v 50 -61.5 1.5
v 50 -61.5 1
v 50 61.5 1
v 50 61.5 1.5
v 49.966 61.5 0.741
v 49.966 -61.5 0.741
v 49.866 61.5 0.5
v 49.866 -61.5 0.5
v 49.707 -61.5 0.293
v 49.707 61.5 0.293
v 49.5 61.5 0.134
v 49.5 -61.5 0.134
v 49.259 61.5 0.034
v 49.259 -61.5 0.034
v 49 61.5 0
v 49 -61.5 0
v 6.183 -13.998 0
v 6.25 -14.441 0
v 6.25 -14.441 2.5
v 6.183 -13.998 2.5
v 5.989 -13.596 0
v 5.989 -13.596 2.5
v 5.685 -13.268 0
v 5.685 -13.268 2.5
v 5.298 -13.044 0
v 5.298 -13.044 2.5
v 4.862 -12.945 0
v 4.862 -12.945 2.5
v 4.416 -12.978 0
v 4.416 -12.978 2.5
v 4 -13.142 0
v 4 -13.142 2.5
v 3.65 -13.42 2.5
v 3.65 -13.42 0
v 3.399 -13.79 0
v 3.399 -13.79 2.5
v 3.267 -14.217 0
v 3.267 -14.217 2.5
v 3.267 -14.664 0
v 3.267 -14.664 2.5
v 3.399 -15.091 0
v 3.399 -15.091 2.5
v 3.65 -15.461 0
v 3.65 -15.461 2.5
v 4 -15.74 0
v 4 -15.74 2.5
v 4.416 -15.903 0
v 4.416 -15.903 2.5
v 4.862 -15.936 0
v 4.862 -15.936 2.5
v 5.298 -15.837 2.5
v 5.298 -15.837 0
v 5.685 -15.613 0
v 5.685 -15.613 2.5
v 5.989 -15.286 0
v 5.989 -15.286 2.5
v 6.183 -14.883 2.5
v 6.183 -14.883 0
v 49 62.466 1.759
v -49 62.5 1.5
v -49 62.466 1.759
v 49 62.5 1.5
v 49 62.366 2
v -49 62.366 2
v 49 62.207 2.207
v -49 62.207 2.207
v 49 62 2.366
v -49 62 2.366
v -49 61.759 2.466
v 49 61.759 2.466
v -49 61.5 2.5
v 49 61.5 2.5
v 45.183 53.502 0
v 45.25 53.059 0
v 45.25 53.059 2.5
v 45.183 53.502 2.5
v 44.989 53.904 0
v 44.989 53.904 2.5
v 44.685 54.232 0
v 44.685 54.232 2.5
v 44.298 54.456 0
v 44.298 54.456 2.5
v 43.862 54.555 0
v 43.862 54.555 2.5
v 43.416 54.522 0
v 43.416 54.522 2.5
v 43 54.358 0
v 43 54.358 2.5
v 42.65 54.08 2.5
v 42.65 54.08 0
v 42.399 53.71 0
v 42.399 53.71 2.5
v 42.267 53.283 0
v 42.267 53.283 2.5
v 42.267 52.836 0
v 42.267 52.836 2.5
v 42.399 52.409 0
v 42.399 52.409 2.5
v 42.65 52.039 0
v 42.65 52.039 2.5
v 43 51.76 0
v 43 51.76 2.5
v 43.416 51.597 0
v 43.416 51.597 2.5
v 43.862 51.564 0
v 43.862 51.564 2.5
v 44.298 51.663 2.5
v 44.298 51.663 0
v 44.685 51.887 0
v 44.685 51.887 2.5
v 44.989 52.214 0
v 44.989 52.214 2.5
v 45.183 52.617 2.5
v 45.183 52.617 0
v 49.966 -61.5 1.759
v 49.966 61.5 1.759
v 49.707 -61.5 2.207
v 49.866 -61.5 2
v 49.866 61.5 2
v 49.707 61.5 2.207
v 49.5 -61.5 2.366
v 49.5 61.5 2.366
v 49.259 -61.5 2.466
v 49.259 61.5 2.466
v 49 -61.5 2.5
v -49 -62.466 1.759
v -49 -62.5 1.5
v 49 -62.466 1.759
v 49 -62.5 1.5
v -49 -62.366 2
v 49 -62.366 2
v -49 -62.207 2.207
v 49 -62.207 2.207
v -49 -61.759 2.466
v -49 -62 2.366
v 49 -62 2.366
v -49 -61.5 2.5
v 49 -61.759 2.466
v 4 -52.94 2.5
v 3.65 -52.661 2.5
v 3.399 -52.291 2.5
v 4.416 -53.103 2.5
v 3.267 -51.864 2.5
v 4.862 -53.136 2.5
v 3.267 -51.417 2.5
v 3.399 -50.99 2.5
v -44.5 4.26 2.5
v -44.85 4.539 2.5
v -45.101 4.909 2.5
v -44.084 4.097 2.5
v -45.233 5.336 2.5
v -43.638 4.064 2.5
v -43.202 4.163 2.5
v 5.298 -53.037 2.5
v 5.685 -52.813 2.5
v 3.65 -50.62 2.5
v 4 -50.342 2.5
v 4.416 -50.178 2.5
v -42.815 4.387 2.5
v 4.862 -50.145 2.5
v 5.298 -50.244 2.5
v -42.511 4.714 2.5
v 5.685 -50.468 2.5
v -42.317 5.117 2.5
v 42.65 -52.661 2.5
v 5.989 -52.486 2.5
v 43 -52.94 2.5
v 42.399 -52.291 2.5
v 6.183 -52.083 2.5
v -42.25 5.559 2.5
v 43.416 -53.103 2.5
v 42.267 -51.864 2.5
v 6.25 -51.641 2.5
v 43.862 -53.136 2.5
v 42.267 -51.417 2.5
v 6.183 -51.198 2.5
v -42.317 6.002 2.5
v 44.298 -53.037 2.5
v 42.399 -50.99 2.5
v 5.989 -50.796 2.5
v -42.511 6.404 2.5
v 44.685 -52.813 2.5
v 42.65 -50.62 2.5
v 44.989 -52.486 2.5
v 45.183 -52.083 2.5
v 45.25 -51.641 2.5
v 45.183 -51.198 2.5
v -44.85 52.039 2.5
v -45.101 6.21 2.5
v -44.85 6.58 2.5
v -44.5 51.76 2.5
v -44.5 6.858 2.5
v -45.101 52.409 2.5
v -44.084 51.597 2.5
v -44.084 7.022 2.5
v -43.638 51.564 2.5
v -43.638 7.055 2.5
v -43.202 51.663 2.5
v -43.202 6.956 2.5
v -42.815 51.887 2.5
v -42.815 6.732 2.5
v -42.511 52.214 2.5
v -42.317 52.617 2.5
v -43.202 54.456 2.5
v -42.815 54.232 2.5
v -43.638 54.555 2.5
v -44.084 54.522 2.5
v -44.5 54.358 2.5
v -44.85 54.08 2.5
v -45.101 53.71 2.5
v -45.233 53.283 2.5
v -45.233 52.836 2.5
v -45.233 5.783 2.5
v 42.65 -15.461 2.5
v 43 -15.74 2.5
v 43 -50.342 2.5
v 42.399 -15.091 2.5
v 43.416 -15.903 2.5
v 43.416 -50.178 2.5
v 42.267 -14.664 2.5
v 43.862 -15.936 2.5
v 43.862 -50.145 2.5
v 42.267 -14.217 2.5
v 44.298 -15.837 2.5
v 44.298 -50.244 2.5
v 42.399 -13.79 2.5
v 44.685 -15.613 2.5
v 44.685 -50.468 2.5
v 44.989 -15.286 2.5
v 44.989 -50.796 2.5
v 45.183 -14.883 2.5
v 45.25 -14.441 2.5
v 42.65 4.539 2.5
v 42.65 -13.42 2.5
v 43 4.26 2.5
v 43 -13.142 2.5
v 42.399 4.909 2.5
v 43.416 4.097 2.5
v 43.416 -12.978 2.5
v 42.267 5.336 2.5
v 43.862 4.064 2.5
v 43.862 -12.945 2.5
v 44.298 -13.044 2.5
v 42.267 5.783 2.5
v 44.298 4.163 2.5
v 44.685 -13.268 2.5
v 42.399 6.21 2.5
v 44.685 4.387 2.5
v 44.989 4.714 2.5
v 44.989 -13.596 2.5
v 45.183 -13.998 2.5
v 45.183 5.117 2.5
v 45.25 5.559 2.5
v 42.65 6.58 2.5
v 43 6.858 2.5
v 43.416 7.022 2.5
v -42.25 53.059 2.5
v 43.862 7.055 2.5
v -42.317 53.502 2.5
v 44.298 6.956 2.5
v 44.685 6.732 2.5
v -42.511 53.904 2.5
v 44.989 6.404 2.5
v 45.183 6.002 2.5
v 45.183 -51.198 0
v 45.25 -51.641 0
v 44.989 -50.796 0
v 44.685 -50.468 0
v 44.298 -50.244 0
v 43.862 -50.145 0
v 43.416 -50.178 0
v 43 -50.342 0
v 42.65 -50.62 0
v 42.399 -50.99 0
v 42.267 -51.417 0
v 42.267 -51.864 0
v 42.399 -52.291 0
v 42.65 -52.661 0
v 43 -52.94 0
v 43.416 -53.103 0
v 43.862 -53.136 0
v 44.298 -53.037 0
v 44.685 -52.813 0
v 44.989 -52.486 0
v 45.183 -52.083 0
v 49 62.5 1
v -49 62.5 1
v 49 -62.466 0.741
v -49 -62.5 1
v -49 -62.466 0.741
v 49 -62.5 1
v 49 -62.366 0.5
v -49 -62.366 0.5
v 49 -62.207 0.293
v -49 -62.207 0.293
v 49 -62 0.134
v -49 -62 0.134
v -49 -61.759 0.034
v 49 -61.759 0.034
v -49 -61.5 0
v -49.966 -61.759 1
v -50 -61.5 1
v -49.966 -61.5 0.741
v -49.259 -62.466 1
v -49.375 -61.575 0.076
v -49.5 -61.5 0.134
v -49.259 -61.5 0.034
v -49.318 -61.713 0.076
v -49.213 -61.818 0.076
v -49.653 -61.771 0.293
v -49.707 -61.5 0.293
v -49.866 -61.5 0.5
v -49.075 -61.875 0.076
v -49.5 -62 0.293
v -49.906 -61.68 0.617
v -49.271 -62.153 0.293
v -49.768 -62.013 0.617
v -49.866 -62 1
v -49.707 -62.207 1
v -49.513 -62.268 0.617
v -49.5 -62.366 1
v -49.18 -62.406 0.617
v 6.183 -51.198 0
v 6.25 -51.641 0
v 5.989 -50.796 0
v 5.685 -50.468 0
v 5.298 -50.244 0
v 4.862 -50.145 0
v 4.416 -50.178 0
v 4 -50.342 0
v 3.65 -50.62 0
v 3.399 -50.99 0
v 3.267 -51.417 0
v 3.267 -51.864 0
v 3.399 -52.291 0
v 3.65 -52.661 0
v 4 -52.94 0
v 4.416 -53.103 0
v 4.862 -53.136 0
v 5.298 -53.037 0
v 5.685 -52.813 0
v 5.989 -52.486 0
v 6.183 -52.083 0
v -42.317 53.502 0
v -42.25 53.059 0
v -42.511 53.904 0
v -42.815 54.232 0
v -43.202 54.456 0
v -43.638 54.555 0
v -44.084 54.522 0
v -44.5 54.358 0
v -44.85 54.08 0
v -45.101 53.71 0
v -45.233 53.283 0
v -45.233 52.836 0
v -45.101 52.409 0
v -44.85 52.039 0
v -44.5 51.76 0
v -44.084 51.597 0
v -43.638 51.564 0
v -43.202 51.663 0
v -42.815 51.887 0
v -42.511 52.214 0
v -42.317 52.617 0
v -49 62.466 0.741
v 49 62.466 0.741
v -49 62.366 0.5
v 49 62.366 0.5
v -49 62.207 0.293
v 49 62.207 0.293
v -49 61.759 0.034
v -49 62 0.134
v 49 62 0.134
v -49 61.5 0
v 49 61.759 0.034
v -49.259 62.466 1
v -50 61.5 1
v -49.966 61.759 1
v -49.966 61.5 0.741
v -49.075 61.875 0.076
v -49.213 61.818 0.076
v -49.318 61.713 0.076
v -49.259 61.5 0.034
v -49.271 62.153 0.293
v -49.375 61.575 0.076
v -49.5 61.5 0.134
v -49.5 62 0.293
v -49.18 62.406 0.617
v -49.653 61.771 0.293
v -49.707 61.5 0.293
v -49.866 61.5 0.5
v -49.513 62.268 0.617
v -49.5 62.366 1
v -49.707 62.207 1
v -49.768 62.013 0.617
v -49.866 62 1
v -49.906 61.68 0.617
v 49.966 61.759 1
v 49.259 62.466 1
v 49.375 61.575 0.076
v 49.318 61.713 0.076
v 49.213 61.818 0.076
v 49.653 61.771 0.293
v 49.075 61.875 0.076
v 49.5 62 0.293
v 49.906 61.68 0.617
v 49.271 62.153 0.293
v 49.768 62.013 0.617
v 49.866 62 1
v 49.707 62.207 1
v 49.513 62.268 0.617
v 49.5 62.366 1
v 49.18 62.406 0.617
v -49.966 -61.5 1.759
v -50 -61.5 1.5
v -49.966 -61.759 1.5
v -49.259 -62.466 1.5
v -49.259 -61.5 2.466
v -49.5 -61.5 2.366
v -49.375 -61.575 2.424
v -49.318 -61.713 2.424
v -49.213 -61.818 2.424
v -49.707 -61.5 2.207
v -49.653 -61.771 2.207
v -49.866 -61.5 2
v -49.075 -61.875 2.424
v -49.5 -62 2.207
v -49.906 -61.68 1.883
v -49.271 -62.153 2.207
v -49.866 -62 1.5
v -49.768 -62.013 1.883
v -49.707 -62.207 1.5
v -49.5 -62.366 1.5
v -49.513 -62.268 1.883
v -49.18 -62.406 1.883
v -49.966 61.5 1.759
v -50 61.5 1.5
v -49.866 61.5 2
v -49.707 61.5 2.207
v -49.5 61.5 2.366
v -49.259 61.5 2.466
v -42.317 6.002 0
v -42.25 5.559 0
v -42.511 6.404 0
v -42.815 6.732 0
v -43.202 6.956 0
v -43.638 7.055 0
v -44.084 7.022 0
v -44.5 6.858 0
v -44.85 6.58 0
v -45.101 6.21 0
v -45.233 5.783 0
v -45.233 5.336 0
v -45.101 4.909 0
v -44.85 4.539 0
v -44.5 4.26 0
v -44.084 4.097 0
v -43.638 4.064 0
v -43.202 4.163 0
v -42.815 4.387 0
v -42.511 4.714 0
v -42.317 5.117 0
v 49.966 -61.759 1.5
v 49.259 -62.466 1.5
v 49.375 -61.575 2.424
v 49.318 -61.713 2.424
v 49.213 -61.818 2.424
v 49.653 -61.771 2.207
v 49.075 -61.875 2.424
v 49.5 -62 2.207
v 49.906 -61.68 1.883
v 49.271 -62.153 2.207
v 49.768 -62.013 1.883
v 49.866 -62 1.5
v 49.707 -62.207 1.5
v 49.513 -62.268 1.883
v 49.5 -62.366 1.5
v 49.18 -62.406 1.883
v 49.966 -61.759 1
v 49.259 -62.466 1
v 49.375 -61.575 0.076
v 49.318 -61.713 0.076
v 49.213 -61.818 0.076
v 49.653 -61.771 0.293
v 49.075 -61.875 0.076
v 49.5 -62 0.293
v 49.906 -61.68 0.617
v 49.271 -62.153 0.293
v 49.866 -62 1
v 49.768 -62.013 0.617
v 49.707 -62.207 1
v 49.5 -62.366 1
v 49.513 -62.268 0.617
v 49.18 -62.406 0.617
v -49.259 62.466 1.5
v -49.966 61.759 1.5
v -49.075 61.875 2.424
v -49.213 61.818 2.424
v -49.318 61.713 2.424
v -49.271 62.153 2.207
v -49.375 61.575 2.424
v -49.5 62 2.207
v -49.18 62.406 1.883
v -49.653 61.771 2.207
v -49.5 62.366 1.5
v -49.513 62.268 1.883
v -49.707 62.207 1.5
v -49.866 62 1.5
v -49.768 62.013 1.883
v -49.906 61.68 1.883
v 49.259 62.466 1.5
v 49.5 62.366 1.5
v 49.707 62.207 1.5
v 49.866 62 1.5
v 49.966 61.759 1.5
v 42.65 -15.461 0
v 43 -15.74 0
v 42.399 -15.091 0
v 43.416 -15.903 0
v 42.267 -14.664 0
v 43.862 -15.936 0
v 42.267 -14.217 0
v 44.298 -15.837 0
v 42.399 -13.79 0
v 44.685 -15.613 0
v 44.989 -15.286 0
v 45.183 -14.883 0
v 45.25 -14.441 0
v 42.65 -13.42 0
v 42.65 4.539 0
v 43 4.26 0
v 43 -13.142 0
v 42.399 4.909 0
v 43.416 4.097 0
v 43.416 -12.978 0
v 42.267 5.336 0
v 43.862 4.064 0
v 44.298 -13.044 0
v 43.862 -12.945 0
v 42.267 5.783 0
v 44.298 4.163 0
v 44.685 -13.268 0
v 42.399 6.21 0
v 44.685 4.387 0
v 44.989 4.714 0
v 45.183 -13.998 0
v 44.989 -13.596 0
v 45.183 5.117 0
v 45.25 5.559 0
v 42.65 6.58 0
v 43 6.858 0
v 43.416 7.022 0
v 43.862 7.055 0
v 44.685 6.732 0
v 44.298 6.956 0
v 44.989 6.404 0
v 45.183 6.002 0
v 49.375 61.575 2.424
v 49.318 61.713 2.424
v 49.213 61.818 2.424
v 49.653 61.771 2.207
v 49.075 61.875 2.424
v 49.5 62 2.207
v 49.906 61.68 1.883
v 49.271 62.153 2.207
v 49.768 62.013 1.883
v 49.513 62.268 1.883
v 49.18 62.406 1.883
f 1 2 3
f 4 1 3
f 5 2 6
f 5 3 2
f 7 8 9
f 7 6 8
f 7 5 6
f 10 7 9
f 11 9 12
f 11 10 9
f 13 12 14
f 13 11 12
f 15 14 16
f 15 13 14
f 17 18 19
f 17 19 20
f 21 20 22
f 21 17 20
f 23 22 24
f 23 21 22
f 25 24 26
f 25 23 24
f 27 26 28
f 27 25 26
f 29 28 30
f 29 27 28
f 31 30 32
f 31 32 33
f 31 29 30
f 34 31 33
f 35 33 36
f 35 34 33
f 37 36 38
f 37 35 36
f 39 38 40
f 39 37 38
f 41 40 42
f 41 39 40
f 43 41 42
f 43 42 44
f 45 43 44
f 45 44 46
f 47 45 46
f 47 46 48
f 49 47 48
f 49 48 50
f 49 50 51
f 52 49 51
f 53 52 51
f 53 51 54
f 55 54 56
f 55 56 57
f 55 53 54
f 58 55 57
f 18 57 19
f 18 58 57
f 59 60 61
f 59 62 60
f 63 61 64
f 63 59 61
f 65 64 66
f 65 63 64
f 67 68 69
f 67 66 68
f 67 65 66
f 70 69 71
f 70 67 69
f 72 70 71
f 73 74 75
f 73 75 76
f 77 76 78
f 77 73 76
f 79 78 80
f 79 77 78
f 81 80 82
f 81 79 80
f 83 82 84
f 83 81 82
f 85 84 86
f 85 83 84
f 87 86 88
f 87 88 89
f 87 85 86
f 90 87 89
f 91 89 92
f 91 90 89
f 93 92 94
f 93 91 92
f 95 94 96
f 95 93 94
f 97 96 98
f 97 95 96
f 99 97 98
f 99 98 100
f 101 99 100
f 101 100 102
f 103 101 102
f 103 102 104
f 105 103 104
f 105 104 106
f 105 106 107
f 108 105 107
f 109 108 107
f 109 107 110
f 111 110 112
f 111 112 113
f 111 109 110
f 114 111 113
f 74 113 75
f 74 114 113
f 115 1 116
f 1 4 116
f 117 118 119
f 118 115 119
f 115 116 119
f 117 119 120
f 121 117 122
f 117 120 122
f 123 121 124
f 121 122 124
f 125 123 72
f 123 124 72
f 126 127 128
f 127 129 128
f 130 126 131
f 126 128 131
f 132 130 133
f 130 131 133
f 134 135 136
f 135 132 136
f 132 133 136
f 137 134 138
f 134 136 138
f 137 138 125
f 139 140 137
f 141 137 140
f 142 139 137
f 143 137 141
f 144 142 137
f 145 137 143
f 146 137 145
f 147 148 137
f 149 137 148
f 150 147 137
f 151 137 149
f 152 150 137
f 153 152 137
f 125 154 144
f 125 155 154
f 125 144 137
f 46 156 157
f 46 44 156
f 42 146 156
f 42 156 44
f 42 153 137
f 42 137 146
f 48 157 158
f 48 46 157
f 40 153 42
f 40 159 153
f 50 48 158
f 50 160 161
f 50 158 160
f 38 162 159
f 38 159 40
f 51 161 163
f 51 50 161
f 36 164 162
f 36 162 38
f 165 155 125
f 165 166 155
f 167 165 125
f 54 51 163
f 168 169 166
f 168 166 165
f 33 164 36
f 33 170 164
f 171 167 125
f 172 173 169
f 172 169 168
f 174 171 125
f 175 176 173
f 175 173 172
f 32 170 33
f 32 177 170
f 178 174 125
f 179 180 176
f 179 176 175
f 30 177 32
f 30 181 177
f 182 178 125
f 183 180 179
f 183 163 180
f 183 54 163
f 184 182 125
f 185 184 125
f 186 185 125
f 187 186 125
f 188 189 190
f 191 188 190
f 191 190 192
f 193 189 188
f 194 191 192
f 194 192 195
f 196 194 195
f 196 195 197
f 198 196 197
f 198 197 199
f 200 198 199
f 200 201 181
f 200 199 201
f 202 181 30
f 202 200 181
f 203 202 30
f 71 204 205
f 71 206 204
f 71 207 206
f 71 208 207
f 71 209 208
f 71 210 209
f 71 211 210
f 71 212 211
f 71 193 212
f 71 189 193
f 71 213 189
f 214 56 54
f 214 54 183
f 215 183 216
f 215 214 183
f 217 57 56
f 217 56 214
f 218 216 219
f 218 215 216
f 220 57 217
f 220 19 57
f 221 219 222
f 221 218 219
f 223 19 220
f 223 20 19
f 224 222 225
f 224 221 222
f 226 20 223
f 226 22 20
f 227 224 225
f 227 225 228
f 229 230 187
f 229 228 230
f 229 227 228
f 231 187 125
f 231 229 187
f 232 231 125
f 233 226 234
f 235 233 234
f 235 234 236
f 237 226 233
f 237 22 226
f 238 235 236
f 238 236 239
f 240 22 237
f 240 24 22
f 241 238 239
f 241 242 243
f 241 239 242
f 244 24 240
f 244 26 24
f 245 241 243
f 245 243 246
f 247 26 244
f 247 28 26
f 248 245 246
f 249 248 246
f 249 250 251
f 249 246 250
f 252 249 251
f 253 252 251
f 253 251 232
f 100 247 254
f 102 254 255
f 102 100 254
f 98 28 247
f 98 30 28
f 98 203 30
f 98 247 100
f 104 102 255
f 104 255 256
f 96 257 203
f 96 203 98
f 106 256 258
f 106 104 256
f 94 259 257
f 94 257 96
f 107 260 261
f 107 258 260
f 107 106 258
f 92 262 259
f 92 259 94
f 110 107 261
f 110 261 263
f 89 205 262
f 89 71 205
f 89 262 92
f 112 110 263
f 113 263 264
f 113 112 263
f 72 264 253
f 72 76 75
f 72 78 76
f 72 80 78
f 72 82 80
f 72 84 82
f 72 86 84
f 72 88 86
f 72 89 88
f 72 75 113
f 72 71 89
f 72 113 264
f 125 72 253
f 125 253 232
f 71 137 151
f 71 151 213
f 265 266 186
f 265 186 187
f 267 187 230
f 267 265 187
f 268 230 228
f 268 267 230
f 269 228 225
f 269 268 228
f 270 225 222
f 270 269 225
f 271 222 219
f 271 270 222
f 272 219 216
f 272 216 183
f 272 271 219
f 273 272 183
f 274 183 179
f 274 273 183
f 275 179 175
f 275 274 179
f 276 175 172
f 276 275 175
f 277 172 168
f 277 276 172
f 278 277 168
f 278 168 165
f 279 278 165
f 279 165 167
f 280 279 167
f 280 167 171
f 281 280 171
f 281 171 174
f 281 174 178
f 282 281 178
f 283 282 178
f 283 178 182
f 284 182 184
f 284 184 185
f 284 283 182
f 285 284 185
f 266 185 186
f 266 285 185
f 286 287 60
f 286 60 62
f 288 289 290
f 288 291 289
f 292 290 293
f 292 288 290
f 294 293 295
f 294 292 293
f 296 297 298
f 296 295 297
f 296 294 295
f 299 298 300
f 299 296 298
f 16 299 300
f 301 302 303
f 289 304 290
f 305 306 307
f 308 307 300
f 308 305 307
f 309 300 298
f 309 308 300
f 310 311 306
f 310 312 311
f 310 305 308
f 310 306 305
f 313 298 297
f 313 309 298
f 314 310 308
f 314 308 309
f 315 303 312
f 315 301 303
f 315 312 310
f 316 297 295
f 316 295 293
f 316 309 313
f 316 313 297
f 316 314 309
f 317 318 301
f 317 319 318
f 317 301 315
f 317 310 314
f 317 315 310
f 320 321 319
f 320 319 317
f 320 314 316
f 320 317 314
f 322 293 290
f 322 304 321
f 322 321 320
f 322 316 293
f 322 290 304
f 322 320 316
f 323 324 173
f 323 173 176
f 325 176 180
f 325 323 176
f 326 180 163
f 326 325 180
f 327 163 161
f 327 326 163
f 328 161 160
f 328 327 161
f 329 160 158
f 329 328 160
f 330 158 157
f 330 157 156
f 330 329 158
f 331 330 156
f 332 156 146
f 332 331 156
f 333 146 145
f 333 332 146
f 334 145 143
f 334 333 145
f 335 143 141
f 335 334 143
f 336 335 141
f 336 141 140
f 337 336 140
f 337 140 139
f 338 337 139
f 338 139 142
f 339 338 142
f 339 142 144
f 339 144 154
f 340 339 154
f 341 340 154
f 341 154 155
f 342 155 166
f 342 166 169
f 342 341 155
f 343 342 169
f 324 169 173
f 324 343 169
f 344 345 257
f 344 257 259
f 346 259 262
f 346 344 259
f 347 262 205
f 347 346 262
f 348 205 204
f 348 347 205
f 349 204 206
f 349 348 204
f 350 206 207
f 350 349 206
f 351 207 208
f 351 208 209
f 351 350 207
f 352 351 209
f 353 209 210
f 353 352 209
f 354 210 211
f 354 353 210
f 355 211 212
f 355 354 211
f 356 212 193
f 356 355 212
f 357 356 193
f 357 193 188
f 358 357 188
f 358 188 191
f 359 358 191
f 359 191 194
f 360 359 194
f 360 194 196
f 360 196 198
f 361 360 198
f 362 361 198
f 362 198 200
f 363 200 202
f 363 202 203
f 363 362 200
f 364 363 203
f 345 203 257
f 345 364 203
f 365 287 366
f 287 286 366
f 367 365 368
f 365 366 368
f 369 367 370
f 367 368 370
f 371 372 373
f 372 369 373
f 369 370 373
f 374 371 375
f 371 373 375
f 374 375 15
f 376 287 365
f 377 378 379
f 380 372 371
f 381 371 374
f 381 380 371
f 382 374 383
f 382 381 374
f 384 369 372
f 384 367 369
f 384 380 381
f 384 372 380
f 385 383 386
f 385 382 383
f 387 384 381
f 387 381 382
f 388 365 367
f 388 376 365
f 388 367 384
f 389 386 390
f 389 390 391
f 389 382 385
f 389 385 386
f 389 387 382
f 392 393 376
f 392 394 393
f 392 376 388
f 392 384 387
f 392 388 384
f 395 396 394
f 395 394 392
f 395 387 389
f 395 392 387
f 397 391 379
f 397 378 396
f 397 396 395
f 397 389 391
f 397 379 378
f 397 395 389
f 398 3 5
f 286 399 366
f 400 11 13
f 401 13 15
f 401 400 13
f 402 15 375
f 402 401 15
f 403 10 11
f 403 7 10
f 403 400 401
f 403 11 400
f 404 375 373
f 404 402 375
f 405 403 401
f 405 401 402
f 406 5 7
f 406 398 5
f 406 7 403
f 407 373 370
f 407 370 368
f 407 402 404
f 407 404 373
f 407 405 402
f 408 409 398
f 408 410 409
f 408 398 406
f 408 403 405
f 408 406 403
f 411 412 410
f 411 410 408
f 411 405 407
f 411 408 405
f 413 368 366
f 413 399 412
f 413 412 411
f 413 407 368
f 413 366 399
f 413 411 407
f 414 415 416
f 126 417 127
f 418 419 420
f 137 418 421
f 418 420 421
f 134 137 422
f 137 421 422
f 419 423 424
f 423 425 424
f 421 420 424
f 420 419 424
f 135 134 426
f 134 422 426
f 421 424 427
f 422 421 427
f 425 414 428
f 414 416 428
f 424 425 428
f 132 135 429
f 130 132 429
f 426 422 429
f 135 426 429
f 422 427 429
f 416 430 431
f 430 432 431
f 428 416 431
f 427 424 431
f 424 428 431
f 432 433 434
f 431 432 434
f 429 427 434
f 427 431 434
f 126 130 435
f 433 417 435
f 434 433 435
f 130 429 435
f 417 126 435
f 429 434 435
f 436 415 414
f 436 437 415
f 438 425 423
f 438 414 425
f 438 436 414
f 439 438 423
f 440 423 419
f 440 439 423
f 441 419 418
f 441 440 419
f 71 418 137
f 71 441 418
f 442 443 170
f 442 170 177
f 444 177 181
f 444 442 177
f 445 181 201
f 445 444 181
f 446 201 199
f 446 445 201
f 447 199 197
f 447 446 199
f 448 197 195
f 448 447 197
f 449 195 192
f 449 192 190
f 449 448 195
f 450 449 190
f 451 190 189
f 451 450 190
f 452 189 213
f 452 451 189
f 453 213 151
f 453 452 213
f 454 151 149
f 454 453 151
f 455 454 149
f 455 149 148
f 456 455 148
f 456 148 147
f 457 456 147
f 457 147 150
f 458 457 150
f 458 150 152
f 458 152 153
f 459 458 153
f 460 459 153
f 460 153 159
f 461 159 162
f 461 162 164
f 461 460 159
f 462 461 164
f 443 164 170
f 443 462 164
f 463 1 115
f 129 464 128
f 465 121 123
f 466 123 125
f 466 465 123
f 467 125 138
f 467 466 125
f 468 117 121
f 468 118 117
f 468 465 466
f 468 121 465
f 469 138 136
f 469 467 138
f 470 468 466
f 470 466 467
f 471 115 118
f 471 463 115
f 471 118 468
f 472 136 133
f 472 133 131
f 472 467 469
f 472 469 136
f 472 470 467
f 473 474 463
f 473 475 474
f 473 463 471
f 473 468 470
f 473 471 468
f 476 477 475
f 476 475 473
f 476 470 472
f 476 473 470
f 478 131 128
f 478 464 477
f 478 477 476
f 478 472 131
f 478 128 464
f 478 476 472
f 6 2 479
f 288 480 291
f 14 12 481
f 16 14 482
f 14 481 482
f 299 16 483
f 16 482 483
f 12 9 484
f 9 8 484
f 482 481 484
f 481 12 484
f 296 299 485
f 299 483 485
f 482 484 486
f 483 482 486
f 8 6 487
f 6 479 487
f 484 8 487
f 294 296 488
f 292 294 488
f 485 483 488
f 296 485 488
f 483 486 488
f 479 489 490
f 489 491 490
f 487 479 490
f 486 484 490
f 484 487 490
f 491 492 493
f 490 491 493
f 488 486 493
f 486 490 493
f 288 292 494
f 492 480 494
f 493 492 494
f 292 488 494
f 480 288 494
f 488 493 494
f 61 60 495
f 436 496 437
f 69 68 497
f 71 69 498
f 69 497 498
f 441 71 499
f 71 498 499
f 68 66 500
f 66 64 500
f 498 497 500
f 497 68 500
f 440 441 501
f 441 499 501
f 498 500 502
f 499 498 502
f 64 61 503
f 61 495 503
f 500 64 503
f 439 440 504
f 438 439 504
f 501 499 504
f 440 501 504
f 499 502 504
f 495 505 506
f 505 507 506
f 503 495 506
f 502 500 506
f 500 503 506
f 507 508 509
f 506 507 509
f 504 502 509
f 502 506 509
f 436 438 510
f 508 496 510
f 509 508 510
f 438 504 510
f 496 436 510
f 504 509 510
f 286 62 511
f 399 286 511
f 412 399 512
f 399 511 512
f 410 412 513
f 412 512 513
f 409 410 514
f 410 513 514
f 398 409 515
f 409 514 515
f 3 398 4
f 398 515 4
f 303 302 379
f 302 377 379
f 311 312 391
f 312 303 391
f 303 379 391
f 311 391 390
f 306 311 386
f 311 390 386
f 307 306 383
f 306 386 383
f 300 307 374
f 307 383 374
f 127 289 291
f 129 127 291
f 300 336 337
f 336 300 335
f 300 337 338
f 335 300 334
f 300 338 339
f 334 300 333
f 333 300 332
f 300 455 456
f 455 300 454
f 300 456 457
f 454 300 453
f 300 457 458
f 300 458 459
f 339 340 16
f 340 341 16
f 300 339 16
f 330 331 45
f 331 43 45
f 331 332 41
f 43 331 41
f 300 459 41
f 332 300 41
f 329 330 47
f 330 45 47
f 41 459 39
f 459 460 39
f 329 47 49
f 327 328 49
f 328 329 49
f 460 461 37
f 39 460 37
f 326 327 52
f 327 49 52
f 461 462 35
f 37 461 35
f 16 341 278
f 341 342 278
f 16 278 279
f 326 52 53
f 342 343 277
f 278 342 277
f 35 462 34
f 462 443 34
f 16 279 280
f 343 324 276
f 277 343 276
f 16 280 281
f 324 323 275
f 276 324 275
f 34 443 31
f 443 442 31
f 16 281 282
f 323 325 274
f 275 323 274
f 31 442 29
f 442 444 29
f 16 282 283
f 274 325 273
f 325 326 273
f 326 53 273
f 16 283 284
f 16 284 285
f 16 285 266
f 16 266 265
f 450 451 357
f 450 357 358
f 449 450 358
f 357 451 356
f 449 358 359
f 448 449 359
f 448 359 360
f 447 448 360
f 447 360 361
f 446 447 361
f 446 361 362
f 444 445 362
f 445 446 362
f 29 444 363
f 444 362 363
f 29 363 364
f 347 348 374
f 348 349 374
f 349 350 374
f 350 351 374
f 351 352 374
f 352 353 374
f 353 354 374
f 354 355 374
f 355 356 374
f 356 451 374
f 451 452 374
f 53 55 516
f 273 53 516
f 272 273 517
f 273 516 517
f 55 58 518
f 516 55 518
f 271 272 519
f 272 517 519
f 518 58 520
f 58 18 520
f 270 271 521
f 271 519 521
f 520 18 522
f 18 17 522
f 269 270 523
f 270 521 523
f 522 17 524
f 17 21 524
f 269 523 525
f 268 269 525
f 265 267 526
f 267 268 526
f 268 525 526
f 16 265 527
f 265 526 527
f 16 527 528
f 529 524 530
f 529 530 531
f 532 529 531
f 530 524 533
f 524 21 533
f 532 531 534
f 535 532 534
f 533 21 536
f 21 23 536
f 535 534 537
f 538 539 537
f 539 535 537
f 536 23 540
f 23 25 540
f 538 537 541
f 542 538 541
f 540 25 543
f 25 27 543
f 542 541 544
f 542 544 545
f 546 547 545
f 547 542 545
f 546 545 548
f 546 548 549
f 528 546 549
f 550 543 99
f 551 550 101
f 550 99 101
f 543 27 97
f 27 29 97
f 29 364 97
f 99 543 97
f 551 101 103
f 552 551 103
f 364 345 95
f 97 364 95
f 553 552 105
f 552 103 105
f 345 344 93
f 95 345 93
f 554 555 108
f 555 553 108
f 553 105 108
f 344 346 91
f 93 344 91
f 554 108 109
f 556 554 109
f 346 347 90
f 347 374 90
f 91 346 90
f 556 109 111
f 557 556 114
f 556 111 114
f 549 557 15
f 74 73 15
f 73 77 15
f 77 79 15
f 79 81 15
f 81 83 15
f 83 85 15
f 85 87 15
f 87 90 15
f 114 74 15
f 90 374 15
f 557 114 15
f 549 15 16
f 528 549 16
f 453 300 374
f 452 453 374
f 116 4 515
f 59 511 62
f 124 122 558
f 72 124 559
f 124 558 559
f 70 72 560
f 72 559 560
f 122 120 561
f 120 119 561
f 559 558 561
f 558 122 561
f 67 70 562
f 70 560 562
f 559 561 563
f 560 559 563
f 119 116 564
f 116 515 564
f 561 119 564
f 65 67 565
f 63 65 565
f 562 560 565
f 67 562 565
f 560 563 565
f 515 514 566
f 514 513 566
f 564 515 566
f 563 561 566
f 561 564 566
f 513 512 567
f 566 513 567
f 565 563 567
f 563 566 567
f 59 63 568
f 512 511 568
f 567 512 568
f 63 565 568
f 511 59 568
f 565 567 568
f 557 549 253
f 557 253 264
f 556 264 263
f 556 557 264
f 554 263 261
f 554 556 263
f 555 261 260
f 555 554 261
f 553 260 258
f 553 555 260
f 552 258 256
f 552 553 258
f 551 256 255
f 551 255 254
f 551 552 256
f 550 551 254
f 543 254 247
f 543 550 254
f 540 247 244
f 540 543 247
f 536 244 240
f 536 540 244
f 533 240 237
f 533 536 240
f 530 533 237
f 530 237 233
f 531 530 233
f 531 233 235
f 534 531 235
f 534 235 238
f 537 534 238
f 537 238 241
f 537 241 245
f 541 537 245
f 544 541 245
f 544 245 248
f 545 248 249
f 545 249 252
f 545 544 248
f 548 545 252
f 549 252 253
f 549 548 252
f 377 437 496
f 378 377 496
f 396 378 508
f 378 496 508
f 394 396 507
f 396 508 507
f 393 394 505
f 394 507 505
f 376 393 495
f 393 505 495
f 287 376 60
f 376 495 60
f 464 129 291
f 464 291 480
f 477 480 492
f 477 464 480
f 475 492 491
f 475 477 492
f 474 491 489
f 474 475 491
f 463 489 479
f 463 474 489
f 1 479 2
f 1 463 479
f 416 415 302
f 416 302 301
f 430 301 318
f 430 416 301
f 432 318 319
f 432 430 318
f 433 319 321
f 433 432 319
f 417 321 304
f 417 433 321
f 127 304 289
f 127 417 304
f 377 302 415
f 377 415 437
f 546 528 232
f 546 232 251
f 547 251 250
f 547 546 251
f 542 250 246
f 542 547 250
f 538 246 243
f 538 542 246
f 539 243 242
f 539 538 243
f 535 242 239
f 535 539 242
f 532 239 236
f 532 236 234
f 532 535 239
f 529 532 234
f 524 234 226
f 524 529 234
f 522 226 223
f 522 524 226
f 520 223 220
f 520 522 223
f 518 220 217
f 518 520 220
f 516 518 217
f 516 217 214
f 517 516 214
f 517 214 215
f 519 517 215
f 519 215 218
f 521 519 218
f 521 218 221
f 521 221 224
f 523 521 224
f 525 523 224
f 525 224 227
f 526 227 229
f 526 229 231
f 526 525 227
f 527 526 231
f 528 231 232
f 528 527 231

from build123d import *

# Parameters (mm, degrees)
SKETCH_W  = 100
SKETCH_H  = 125
SKETCH_R  = 1.5
PAD_DEPTH = 2.5
FILLET_R  = 1


with BuildPart() as part:
    # Sketch → Pad (new body)
    with BuildSketch(Plane.XY):
        Rectangle(SKETCH_W, SKETCH_H)
        with Locations((-43.75, 53.059436)):
            Circle(SKETCH_R, mode=Mode.SUBTRACT)
        with Locations((43.75, 53.059436)):
            Circle(SKETCH_R, mode=Mode.SUBTRACT)
        with Locations((43.75, 5.559436)):
            Circle(SKETCH_R, mode=Mode.SUBTRACT)
        with Locations((43.75, -14.440564)):
            Circle(SKETCH_R, mode=Mode.SUBTRACT)
        with Locations((4.75, -14.440564)):
            Circle(SKETCH_R, mode=Mode.SUBTRACT)
        with Locations((43.75, -51.640564)):
            Circle(SKETCH_R, mode=Mode.SUBTRACT)
        with Locations((-43.75, 5.559436)):
            Circle(SKETCH_R, mode=Mode.SUBTRACT)
        with Locations((4.75, -51.640564)):
            Circle(SKETCH_R, mode=Mode.SUBTRACT)
    extrude(amount=PAD_DEPTH)

    # Fillet
    fillet_edges = [part.edges().sort_by_distance(p)[0] for p in [
        (50, 62.5, 1.25),
        (50, -62.5, 1.25),
        (50, 0, 0),
        (50, 0, 2.5),
        (-50, 62.5, 1.25),
        (0, 62.5, 0),
        (0, 62.5, 2.5),
        (-50, -62.5, 1.25),
        (-50, 0, 0),
        (-50, 0, 2.5),
        (0, -62.5, 0),
        (0, -62.5, 2.5),
    ]]
    fillet(fillet_edges, radius=FILLET_R)


solid = part.part
